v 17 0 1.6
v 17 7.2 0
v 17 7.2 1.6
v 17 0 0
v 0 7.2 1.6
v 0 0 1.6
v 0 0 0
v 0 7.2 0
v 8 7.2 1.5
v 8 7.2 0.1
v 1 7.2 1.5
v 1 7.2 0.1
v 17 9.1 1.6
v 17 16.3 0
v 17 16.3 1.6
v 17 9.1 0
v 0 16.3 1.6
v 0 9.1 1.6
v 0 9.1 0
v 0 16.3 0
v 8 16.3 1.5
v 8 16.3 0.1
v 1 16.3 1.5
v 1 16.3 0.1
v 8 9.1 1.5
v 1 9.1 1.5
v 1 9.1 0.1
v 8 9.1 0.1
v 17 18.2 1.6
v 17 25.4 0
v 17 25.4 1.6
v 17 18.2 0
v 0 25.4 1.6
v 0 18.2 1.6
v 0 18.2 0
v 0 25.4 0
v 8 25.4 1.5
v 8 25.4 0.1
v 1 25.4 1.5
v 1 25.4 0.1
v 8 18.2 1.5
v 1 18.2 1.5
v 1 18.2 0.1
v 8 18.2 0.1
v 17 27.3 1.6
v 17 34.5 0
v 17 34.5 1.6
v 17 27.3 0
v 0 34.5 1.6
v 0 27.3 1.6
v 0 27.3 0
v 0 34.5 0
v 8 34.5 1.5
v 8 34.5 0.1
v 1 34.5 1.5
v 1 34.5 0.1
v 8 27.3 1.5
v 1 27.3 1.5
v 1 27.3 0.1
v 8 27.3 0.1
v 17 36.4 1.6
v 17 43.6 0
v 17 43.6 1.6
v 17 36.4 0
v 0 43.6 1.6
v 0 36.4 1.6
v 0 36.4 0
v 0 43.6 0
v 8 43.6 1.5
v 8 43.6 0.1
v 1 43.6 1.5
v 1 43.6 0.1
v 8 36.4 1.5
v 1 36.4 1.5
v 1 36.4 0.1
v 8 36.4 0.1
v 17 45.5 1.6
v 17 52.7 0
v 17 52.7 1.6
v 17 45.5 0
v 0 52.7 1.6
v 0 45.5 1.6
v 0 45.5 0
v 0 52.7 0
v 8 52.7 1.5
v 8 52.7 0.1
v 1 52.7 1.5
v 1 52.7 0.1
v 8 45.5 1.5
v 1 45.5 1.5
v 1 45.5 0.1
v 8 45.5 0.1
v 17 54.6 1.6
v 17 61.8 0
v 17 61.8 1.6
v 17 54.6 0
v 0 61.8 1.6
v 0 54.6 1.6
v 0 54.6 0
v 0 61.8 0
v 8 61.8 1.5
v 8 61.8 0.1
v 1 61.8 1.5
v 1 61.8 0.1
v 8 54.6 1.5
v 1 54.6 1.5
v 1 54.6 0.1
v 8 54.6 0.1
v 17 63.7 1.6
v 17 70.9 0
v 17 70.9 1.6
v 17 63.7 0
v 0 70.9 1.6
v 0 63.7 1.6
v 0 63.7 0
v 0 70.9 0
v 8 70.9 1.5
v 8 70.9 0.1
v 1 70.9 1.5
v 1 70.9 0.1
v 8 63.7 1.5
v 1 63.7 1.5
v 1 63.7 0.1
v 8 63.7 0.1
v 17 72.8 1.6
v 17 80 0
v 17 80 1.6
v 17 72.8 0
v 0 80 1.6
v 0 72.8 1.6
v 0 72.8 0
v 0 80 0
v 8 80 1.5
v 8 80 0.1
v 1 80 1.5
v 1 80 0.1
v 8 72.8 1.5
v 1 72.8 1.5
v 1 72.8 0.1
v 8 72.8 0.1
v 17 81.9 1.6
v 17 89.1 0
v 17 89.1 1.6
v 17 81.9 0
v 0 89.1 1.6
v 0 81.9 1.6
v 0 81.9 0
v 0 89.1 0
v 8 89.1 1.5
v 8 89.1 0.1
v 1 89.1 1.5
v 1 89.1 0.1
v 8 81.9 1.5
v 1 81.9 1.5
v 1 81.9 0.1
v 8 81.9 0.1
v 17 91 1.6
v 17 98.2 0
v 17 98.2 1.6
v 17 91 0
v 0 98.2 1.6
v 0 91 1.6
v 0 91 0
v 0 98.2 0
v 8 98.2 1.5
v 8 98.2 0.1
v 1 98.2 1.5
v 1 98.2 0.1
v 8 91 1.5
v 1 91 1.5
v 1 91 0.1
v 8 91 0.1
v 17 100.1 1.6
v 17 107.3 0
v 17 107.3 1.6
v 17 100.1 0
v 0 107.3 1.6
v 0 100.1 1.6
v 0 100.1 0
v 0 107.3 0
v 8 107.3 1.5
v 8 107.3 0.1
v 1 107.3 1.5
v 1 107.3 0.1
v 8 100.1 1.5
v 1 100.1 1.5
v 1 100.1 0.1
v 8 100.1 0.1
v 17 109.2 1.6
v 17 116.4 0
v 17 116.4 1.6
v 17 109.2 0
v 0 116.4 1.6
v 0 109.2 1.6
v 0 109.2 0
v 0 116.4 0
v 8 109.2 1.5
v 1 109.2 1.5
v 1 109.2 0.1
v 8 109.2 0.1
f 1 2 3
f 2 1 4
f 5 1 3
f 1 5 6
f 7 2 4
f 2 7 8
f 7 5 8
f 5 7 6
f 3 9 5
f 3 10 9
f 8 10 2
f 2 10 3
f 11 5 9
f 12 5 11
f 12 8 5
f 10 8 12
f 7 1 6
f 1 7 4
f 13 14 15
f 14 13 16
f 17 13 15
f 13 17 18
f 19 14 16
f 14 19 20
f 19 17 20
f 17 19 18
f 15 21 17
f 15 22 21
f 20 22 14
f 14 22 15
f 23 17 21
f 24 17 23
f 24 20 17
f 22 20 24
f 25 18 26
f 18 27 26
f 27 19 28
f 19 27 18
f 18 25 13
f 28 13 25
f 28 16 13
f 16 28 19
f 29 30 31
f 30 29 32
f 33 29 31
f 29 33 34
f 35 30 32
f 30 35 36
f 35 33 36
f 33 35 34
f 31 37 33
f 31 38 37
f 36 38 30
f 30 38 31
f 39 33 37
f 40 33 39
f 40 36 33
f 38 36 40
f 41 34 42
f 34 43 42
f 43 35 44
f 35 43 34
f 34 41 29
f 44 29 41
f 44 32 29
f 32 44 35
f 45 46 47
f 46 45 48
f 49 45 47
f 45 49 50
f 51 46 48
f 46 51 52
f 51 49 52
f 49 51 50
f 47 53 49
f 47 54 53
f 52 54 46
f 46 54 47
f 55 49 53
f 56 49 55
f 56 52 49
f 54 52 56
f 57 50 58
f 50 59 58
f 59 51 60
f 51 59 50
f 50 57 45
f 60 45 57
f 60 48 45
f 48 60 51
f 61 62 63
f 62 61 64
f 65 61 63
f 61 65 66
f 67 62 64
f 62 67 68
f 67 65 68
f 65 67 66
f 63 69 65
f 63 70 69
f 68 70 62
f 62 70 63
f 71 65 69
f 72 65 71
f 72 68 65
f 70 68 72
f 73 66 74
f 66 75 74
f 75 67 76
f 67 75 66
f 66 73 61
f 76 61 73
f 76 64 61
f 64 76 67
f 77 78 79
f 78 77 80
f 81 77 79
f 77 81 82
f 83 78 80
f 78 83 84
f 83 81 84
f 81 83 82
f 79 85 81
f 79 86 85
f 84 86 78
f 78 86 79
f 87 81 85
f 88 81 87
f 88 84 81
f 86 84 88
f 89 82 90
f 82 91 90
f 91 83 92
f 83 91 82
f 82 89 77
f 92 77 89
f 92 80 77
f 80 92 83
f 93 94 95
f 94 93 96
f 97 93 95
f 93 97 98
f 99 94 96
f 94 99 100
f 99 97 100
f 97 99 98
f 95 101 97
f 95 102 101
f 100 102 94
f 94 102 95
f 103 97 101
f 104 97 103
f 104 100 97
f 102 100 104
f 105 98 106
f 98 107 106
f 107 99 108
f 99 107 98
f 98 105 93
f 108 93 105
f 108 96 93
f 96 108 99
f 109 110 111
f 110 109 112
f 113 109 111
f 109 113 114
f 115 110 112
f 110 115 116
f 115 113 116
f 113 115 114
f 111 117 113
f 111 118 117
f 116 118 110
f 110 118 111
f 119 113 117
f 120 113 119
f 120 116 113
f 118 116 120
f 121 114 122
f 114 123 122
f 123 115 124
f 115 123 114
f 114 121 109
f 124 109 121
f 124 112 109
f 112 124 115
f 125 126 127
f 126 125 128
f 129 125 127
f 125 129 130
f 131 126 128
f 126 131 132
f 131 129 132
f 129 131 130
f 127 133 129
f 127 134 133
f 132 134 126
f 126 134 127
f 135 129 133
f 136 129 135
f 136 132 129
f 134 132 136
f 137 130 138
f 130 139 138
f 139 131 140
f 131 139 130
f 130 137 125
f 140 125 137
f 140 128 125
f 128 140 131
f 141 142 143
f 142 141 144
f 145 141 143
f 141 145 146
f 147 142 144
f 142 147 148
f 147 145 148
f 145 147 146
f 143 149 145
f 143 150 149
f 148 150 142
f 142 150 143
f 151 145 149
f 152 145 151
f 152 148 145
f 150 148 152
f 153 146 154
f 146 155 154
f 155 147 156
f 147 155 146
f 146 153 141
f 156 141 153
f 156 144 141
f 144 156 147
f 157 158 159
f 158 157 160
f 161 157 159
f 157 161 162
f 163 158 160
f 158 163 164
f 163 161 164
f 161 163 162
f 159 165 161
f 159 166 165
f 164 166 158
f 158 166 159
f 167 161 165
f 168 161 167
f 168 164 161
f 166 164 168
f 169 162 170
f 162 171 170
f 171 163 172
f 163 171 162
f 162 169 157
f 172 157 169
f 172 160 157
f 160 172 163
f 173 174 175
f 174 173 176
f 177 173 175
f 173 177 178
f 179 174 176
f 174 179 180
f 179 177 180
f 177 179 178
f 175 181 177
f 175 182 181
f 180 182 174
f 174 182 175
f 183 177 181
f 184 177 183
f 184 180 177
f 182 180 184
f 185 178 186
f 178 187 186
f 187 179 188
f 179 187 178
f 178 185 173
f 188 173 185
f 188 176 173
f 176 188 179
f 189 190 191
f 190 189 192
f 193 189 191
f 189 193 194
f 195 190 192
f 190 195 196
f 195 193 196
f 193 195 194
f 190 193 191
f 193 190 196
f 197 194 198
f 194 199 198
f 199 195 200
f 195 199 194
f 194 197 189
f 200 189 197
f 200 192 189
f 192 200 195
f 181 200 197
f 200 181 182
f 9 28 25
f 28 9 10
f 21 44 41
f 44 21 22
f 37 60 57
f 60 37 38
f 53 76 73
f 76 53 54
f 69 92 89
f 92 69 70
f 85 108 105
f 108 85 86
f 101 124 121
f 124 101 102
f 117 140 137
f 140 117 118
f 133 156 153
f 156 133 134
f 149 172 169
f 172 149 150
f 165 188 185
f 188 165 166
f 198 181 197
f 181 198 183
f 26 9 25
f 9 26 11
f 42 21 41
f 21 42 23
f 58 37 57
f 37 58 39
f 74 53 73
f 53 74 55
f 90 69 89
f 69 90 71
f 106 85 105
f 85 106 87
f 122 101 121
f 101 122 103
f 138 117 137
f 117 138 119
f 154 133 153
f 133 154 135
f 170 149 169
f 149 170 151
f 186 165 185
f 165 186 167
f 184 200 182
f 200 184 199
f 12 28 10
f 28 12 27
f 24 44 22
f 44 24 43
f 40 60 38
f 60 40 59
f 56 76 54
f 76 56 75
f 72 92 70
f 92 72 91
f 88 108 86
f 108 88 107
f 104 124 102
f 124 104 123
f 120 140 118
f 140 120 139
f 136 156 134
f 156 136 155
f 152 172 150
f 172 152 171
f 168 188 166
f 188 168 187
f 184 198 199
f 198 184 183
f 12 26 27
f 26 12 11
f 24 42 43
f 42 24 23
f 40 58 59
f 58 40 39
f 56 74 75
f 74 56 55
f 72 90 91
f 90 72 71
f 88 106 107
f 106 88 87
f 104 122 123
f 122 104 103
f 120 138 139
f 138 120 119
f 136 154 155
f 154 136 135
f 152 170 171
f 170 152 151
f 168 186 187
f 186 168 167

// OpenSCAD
$fn=50;
Repeat = 13;



//minkowski(){
//cube([18.6,6.2,0.6],0);
//sphere(0.7);
//}


for (a =[0:Repeat-1]) {
    
   translate([0,a*(7.4+1.6+0.1),0])
  //  minkowski(){
cube([17,7.2, 1.6],0);
//sphere(0.7);
//}
}

translate([1,0,0.1])
//minkowski(){
cube([7,(7.4+1.6+0.1)*(Repeat-1),1.6-0.2],0);
//}   
